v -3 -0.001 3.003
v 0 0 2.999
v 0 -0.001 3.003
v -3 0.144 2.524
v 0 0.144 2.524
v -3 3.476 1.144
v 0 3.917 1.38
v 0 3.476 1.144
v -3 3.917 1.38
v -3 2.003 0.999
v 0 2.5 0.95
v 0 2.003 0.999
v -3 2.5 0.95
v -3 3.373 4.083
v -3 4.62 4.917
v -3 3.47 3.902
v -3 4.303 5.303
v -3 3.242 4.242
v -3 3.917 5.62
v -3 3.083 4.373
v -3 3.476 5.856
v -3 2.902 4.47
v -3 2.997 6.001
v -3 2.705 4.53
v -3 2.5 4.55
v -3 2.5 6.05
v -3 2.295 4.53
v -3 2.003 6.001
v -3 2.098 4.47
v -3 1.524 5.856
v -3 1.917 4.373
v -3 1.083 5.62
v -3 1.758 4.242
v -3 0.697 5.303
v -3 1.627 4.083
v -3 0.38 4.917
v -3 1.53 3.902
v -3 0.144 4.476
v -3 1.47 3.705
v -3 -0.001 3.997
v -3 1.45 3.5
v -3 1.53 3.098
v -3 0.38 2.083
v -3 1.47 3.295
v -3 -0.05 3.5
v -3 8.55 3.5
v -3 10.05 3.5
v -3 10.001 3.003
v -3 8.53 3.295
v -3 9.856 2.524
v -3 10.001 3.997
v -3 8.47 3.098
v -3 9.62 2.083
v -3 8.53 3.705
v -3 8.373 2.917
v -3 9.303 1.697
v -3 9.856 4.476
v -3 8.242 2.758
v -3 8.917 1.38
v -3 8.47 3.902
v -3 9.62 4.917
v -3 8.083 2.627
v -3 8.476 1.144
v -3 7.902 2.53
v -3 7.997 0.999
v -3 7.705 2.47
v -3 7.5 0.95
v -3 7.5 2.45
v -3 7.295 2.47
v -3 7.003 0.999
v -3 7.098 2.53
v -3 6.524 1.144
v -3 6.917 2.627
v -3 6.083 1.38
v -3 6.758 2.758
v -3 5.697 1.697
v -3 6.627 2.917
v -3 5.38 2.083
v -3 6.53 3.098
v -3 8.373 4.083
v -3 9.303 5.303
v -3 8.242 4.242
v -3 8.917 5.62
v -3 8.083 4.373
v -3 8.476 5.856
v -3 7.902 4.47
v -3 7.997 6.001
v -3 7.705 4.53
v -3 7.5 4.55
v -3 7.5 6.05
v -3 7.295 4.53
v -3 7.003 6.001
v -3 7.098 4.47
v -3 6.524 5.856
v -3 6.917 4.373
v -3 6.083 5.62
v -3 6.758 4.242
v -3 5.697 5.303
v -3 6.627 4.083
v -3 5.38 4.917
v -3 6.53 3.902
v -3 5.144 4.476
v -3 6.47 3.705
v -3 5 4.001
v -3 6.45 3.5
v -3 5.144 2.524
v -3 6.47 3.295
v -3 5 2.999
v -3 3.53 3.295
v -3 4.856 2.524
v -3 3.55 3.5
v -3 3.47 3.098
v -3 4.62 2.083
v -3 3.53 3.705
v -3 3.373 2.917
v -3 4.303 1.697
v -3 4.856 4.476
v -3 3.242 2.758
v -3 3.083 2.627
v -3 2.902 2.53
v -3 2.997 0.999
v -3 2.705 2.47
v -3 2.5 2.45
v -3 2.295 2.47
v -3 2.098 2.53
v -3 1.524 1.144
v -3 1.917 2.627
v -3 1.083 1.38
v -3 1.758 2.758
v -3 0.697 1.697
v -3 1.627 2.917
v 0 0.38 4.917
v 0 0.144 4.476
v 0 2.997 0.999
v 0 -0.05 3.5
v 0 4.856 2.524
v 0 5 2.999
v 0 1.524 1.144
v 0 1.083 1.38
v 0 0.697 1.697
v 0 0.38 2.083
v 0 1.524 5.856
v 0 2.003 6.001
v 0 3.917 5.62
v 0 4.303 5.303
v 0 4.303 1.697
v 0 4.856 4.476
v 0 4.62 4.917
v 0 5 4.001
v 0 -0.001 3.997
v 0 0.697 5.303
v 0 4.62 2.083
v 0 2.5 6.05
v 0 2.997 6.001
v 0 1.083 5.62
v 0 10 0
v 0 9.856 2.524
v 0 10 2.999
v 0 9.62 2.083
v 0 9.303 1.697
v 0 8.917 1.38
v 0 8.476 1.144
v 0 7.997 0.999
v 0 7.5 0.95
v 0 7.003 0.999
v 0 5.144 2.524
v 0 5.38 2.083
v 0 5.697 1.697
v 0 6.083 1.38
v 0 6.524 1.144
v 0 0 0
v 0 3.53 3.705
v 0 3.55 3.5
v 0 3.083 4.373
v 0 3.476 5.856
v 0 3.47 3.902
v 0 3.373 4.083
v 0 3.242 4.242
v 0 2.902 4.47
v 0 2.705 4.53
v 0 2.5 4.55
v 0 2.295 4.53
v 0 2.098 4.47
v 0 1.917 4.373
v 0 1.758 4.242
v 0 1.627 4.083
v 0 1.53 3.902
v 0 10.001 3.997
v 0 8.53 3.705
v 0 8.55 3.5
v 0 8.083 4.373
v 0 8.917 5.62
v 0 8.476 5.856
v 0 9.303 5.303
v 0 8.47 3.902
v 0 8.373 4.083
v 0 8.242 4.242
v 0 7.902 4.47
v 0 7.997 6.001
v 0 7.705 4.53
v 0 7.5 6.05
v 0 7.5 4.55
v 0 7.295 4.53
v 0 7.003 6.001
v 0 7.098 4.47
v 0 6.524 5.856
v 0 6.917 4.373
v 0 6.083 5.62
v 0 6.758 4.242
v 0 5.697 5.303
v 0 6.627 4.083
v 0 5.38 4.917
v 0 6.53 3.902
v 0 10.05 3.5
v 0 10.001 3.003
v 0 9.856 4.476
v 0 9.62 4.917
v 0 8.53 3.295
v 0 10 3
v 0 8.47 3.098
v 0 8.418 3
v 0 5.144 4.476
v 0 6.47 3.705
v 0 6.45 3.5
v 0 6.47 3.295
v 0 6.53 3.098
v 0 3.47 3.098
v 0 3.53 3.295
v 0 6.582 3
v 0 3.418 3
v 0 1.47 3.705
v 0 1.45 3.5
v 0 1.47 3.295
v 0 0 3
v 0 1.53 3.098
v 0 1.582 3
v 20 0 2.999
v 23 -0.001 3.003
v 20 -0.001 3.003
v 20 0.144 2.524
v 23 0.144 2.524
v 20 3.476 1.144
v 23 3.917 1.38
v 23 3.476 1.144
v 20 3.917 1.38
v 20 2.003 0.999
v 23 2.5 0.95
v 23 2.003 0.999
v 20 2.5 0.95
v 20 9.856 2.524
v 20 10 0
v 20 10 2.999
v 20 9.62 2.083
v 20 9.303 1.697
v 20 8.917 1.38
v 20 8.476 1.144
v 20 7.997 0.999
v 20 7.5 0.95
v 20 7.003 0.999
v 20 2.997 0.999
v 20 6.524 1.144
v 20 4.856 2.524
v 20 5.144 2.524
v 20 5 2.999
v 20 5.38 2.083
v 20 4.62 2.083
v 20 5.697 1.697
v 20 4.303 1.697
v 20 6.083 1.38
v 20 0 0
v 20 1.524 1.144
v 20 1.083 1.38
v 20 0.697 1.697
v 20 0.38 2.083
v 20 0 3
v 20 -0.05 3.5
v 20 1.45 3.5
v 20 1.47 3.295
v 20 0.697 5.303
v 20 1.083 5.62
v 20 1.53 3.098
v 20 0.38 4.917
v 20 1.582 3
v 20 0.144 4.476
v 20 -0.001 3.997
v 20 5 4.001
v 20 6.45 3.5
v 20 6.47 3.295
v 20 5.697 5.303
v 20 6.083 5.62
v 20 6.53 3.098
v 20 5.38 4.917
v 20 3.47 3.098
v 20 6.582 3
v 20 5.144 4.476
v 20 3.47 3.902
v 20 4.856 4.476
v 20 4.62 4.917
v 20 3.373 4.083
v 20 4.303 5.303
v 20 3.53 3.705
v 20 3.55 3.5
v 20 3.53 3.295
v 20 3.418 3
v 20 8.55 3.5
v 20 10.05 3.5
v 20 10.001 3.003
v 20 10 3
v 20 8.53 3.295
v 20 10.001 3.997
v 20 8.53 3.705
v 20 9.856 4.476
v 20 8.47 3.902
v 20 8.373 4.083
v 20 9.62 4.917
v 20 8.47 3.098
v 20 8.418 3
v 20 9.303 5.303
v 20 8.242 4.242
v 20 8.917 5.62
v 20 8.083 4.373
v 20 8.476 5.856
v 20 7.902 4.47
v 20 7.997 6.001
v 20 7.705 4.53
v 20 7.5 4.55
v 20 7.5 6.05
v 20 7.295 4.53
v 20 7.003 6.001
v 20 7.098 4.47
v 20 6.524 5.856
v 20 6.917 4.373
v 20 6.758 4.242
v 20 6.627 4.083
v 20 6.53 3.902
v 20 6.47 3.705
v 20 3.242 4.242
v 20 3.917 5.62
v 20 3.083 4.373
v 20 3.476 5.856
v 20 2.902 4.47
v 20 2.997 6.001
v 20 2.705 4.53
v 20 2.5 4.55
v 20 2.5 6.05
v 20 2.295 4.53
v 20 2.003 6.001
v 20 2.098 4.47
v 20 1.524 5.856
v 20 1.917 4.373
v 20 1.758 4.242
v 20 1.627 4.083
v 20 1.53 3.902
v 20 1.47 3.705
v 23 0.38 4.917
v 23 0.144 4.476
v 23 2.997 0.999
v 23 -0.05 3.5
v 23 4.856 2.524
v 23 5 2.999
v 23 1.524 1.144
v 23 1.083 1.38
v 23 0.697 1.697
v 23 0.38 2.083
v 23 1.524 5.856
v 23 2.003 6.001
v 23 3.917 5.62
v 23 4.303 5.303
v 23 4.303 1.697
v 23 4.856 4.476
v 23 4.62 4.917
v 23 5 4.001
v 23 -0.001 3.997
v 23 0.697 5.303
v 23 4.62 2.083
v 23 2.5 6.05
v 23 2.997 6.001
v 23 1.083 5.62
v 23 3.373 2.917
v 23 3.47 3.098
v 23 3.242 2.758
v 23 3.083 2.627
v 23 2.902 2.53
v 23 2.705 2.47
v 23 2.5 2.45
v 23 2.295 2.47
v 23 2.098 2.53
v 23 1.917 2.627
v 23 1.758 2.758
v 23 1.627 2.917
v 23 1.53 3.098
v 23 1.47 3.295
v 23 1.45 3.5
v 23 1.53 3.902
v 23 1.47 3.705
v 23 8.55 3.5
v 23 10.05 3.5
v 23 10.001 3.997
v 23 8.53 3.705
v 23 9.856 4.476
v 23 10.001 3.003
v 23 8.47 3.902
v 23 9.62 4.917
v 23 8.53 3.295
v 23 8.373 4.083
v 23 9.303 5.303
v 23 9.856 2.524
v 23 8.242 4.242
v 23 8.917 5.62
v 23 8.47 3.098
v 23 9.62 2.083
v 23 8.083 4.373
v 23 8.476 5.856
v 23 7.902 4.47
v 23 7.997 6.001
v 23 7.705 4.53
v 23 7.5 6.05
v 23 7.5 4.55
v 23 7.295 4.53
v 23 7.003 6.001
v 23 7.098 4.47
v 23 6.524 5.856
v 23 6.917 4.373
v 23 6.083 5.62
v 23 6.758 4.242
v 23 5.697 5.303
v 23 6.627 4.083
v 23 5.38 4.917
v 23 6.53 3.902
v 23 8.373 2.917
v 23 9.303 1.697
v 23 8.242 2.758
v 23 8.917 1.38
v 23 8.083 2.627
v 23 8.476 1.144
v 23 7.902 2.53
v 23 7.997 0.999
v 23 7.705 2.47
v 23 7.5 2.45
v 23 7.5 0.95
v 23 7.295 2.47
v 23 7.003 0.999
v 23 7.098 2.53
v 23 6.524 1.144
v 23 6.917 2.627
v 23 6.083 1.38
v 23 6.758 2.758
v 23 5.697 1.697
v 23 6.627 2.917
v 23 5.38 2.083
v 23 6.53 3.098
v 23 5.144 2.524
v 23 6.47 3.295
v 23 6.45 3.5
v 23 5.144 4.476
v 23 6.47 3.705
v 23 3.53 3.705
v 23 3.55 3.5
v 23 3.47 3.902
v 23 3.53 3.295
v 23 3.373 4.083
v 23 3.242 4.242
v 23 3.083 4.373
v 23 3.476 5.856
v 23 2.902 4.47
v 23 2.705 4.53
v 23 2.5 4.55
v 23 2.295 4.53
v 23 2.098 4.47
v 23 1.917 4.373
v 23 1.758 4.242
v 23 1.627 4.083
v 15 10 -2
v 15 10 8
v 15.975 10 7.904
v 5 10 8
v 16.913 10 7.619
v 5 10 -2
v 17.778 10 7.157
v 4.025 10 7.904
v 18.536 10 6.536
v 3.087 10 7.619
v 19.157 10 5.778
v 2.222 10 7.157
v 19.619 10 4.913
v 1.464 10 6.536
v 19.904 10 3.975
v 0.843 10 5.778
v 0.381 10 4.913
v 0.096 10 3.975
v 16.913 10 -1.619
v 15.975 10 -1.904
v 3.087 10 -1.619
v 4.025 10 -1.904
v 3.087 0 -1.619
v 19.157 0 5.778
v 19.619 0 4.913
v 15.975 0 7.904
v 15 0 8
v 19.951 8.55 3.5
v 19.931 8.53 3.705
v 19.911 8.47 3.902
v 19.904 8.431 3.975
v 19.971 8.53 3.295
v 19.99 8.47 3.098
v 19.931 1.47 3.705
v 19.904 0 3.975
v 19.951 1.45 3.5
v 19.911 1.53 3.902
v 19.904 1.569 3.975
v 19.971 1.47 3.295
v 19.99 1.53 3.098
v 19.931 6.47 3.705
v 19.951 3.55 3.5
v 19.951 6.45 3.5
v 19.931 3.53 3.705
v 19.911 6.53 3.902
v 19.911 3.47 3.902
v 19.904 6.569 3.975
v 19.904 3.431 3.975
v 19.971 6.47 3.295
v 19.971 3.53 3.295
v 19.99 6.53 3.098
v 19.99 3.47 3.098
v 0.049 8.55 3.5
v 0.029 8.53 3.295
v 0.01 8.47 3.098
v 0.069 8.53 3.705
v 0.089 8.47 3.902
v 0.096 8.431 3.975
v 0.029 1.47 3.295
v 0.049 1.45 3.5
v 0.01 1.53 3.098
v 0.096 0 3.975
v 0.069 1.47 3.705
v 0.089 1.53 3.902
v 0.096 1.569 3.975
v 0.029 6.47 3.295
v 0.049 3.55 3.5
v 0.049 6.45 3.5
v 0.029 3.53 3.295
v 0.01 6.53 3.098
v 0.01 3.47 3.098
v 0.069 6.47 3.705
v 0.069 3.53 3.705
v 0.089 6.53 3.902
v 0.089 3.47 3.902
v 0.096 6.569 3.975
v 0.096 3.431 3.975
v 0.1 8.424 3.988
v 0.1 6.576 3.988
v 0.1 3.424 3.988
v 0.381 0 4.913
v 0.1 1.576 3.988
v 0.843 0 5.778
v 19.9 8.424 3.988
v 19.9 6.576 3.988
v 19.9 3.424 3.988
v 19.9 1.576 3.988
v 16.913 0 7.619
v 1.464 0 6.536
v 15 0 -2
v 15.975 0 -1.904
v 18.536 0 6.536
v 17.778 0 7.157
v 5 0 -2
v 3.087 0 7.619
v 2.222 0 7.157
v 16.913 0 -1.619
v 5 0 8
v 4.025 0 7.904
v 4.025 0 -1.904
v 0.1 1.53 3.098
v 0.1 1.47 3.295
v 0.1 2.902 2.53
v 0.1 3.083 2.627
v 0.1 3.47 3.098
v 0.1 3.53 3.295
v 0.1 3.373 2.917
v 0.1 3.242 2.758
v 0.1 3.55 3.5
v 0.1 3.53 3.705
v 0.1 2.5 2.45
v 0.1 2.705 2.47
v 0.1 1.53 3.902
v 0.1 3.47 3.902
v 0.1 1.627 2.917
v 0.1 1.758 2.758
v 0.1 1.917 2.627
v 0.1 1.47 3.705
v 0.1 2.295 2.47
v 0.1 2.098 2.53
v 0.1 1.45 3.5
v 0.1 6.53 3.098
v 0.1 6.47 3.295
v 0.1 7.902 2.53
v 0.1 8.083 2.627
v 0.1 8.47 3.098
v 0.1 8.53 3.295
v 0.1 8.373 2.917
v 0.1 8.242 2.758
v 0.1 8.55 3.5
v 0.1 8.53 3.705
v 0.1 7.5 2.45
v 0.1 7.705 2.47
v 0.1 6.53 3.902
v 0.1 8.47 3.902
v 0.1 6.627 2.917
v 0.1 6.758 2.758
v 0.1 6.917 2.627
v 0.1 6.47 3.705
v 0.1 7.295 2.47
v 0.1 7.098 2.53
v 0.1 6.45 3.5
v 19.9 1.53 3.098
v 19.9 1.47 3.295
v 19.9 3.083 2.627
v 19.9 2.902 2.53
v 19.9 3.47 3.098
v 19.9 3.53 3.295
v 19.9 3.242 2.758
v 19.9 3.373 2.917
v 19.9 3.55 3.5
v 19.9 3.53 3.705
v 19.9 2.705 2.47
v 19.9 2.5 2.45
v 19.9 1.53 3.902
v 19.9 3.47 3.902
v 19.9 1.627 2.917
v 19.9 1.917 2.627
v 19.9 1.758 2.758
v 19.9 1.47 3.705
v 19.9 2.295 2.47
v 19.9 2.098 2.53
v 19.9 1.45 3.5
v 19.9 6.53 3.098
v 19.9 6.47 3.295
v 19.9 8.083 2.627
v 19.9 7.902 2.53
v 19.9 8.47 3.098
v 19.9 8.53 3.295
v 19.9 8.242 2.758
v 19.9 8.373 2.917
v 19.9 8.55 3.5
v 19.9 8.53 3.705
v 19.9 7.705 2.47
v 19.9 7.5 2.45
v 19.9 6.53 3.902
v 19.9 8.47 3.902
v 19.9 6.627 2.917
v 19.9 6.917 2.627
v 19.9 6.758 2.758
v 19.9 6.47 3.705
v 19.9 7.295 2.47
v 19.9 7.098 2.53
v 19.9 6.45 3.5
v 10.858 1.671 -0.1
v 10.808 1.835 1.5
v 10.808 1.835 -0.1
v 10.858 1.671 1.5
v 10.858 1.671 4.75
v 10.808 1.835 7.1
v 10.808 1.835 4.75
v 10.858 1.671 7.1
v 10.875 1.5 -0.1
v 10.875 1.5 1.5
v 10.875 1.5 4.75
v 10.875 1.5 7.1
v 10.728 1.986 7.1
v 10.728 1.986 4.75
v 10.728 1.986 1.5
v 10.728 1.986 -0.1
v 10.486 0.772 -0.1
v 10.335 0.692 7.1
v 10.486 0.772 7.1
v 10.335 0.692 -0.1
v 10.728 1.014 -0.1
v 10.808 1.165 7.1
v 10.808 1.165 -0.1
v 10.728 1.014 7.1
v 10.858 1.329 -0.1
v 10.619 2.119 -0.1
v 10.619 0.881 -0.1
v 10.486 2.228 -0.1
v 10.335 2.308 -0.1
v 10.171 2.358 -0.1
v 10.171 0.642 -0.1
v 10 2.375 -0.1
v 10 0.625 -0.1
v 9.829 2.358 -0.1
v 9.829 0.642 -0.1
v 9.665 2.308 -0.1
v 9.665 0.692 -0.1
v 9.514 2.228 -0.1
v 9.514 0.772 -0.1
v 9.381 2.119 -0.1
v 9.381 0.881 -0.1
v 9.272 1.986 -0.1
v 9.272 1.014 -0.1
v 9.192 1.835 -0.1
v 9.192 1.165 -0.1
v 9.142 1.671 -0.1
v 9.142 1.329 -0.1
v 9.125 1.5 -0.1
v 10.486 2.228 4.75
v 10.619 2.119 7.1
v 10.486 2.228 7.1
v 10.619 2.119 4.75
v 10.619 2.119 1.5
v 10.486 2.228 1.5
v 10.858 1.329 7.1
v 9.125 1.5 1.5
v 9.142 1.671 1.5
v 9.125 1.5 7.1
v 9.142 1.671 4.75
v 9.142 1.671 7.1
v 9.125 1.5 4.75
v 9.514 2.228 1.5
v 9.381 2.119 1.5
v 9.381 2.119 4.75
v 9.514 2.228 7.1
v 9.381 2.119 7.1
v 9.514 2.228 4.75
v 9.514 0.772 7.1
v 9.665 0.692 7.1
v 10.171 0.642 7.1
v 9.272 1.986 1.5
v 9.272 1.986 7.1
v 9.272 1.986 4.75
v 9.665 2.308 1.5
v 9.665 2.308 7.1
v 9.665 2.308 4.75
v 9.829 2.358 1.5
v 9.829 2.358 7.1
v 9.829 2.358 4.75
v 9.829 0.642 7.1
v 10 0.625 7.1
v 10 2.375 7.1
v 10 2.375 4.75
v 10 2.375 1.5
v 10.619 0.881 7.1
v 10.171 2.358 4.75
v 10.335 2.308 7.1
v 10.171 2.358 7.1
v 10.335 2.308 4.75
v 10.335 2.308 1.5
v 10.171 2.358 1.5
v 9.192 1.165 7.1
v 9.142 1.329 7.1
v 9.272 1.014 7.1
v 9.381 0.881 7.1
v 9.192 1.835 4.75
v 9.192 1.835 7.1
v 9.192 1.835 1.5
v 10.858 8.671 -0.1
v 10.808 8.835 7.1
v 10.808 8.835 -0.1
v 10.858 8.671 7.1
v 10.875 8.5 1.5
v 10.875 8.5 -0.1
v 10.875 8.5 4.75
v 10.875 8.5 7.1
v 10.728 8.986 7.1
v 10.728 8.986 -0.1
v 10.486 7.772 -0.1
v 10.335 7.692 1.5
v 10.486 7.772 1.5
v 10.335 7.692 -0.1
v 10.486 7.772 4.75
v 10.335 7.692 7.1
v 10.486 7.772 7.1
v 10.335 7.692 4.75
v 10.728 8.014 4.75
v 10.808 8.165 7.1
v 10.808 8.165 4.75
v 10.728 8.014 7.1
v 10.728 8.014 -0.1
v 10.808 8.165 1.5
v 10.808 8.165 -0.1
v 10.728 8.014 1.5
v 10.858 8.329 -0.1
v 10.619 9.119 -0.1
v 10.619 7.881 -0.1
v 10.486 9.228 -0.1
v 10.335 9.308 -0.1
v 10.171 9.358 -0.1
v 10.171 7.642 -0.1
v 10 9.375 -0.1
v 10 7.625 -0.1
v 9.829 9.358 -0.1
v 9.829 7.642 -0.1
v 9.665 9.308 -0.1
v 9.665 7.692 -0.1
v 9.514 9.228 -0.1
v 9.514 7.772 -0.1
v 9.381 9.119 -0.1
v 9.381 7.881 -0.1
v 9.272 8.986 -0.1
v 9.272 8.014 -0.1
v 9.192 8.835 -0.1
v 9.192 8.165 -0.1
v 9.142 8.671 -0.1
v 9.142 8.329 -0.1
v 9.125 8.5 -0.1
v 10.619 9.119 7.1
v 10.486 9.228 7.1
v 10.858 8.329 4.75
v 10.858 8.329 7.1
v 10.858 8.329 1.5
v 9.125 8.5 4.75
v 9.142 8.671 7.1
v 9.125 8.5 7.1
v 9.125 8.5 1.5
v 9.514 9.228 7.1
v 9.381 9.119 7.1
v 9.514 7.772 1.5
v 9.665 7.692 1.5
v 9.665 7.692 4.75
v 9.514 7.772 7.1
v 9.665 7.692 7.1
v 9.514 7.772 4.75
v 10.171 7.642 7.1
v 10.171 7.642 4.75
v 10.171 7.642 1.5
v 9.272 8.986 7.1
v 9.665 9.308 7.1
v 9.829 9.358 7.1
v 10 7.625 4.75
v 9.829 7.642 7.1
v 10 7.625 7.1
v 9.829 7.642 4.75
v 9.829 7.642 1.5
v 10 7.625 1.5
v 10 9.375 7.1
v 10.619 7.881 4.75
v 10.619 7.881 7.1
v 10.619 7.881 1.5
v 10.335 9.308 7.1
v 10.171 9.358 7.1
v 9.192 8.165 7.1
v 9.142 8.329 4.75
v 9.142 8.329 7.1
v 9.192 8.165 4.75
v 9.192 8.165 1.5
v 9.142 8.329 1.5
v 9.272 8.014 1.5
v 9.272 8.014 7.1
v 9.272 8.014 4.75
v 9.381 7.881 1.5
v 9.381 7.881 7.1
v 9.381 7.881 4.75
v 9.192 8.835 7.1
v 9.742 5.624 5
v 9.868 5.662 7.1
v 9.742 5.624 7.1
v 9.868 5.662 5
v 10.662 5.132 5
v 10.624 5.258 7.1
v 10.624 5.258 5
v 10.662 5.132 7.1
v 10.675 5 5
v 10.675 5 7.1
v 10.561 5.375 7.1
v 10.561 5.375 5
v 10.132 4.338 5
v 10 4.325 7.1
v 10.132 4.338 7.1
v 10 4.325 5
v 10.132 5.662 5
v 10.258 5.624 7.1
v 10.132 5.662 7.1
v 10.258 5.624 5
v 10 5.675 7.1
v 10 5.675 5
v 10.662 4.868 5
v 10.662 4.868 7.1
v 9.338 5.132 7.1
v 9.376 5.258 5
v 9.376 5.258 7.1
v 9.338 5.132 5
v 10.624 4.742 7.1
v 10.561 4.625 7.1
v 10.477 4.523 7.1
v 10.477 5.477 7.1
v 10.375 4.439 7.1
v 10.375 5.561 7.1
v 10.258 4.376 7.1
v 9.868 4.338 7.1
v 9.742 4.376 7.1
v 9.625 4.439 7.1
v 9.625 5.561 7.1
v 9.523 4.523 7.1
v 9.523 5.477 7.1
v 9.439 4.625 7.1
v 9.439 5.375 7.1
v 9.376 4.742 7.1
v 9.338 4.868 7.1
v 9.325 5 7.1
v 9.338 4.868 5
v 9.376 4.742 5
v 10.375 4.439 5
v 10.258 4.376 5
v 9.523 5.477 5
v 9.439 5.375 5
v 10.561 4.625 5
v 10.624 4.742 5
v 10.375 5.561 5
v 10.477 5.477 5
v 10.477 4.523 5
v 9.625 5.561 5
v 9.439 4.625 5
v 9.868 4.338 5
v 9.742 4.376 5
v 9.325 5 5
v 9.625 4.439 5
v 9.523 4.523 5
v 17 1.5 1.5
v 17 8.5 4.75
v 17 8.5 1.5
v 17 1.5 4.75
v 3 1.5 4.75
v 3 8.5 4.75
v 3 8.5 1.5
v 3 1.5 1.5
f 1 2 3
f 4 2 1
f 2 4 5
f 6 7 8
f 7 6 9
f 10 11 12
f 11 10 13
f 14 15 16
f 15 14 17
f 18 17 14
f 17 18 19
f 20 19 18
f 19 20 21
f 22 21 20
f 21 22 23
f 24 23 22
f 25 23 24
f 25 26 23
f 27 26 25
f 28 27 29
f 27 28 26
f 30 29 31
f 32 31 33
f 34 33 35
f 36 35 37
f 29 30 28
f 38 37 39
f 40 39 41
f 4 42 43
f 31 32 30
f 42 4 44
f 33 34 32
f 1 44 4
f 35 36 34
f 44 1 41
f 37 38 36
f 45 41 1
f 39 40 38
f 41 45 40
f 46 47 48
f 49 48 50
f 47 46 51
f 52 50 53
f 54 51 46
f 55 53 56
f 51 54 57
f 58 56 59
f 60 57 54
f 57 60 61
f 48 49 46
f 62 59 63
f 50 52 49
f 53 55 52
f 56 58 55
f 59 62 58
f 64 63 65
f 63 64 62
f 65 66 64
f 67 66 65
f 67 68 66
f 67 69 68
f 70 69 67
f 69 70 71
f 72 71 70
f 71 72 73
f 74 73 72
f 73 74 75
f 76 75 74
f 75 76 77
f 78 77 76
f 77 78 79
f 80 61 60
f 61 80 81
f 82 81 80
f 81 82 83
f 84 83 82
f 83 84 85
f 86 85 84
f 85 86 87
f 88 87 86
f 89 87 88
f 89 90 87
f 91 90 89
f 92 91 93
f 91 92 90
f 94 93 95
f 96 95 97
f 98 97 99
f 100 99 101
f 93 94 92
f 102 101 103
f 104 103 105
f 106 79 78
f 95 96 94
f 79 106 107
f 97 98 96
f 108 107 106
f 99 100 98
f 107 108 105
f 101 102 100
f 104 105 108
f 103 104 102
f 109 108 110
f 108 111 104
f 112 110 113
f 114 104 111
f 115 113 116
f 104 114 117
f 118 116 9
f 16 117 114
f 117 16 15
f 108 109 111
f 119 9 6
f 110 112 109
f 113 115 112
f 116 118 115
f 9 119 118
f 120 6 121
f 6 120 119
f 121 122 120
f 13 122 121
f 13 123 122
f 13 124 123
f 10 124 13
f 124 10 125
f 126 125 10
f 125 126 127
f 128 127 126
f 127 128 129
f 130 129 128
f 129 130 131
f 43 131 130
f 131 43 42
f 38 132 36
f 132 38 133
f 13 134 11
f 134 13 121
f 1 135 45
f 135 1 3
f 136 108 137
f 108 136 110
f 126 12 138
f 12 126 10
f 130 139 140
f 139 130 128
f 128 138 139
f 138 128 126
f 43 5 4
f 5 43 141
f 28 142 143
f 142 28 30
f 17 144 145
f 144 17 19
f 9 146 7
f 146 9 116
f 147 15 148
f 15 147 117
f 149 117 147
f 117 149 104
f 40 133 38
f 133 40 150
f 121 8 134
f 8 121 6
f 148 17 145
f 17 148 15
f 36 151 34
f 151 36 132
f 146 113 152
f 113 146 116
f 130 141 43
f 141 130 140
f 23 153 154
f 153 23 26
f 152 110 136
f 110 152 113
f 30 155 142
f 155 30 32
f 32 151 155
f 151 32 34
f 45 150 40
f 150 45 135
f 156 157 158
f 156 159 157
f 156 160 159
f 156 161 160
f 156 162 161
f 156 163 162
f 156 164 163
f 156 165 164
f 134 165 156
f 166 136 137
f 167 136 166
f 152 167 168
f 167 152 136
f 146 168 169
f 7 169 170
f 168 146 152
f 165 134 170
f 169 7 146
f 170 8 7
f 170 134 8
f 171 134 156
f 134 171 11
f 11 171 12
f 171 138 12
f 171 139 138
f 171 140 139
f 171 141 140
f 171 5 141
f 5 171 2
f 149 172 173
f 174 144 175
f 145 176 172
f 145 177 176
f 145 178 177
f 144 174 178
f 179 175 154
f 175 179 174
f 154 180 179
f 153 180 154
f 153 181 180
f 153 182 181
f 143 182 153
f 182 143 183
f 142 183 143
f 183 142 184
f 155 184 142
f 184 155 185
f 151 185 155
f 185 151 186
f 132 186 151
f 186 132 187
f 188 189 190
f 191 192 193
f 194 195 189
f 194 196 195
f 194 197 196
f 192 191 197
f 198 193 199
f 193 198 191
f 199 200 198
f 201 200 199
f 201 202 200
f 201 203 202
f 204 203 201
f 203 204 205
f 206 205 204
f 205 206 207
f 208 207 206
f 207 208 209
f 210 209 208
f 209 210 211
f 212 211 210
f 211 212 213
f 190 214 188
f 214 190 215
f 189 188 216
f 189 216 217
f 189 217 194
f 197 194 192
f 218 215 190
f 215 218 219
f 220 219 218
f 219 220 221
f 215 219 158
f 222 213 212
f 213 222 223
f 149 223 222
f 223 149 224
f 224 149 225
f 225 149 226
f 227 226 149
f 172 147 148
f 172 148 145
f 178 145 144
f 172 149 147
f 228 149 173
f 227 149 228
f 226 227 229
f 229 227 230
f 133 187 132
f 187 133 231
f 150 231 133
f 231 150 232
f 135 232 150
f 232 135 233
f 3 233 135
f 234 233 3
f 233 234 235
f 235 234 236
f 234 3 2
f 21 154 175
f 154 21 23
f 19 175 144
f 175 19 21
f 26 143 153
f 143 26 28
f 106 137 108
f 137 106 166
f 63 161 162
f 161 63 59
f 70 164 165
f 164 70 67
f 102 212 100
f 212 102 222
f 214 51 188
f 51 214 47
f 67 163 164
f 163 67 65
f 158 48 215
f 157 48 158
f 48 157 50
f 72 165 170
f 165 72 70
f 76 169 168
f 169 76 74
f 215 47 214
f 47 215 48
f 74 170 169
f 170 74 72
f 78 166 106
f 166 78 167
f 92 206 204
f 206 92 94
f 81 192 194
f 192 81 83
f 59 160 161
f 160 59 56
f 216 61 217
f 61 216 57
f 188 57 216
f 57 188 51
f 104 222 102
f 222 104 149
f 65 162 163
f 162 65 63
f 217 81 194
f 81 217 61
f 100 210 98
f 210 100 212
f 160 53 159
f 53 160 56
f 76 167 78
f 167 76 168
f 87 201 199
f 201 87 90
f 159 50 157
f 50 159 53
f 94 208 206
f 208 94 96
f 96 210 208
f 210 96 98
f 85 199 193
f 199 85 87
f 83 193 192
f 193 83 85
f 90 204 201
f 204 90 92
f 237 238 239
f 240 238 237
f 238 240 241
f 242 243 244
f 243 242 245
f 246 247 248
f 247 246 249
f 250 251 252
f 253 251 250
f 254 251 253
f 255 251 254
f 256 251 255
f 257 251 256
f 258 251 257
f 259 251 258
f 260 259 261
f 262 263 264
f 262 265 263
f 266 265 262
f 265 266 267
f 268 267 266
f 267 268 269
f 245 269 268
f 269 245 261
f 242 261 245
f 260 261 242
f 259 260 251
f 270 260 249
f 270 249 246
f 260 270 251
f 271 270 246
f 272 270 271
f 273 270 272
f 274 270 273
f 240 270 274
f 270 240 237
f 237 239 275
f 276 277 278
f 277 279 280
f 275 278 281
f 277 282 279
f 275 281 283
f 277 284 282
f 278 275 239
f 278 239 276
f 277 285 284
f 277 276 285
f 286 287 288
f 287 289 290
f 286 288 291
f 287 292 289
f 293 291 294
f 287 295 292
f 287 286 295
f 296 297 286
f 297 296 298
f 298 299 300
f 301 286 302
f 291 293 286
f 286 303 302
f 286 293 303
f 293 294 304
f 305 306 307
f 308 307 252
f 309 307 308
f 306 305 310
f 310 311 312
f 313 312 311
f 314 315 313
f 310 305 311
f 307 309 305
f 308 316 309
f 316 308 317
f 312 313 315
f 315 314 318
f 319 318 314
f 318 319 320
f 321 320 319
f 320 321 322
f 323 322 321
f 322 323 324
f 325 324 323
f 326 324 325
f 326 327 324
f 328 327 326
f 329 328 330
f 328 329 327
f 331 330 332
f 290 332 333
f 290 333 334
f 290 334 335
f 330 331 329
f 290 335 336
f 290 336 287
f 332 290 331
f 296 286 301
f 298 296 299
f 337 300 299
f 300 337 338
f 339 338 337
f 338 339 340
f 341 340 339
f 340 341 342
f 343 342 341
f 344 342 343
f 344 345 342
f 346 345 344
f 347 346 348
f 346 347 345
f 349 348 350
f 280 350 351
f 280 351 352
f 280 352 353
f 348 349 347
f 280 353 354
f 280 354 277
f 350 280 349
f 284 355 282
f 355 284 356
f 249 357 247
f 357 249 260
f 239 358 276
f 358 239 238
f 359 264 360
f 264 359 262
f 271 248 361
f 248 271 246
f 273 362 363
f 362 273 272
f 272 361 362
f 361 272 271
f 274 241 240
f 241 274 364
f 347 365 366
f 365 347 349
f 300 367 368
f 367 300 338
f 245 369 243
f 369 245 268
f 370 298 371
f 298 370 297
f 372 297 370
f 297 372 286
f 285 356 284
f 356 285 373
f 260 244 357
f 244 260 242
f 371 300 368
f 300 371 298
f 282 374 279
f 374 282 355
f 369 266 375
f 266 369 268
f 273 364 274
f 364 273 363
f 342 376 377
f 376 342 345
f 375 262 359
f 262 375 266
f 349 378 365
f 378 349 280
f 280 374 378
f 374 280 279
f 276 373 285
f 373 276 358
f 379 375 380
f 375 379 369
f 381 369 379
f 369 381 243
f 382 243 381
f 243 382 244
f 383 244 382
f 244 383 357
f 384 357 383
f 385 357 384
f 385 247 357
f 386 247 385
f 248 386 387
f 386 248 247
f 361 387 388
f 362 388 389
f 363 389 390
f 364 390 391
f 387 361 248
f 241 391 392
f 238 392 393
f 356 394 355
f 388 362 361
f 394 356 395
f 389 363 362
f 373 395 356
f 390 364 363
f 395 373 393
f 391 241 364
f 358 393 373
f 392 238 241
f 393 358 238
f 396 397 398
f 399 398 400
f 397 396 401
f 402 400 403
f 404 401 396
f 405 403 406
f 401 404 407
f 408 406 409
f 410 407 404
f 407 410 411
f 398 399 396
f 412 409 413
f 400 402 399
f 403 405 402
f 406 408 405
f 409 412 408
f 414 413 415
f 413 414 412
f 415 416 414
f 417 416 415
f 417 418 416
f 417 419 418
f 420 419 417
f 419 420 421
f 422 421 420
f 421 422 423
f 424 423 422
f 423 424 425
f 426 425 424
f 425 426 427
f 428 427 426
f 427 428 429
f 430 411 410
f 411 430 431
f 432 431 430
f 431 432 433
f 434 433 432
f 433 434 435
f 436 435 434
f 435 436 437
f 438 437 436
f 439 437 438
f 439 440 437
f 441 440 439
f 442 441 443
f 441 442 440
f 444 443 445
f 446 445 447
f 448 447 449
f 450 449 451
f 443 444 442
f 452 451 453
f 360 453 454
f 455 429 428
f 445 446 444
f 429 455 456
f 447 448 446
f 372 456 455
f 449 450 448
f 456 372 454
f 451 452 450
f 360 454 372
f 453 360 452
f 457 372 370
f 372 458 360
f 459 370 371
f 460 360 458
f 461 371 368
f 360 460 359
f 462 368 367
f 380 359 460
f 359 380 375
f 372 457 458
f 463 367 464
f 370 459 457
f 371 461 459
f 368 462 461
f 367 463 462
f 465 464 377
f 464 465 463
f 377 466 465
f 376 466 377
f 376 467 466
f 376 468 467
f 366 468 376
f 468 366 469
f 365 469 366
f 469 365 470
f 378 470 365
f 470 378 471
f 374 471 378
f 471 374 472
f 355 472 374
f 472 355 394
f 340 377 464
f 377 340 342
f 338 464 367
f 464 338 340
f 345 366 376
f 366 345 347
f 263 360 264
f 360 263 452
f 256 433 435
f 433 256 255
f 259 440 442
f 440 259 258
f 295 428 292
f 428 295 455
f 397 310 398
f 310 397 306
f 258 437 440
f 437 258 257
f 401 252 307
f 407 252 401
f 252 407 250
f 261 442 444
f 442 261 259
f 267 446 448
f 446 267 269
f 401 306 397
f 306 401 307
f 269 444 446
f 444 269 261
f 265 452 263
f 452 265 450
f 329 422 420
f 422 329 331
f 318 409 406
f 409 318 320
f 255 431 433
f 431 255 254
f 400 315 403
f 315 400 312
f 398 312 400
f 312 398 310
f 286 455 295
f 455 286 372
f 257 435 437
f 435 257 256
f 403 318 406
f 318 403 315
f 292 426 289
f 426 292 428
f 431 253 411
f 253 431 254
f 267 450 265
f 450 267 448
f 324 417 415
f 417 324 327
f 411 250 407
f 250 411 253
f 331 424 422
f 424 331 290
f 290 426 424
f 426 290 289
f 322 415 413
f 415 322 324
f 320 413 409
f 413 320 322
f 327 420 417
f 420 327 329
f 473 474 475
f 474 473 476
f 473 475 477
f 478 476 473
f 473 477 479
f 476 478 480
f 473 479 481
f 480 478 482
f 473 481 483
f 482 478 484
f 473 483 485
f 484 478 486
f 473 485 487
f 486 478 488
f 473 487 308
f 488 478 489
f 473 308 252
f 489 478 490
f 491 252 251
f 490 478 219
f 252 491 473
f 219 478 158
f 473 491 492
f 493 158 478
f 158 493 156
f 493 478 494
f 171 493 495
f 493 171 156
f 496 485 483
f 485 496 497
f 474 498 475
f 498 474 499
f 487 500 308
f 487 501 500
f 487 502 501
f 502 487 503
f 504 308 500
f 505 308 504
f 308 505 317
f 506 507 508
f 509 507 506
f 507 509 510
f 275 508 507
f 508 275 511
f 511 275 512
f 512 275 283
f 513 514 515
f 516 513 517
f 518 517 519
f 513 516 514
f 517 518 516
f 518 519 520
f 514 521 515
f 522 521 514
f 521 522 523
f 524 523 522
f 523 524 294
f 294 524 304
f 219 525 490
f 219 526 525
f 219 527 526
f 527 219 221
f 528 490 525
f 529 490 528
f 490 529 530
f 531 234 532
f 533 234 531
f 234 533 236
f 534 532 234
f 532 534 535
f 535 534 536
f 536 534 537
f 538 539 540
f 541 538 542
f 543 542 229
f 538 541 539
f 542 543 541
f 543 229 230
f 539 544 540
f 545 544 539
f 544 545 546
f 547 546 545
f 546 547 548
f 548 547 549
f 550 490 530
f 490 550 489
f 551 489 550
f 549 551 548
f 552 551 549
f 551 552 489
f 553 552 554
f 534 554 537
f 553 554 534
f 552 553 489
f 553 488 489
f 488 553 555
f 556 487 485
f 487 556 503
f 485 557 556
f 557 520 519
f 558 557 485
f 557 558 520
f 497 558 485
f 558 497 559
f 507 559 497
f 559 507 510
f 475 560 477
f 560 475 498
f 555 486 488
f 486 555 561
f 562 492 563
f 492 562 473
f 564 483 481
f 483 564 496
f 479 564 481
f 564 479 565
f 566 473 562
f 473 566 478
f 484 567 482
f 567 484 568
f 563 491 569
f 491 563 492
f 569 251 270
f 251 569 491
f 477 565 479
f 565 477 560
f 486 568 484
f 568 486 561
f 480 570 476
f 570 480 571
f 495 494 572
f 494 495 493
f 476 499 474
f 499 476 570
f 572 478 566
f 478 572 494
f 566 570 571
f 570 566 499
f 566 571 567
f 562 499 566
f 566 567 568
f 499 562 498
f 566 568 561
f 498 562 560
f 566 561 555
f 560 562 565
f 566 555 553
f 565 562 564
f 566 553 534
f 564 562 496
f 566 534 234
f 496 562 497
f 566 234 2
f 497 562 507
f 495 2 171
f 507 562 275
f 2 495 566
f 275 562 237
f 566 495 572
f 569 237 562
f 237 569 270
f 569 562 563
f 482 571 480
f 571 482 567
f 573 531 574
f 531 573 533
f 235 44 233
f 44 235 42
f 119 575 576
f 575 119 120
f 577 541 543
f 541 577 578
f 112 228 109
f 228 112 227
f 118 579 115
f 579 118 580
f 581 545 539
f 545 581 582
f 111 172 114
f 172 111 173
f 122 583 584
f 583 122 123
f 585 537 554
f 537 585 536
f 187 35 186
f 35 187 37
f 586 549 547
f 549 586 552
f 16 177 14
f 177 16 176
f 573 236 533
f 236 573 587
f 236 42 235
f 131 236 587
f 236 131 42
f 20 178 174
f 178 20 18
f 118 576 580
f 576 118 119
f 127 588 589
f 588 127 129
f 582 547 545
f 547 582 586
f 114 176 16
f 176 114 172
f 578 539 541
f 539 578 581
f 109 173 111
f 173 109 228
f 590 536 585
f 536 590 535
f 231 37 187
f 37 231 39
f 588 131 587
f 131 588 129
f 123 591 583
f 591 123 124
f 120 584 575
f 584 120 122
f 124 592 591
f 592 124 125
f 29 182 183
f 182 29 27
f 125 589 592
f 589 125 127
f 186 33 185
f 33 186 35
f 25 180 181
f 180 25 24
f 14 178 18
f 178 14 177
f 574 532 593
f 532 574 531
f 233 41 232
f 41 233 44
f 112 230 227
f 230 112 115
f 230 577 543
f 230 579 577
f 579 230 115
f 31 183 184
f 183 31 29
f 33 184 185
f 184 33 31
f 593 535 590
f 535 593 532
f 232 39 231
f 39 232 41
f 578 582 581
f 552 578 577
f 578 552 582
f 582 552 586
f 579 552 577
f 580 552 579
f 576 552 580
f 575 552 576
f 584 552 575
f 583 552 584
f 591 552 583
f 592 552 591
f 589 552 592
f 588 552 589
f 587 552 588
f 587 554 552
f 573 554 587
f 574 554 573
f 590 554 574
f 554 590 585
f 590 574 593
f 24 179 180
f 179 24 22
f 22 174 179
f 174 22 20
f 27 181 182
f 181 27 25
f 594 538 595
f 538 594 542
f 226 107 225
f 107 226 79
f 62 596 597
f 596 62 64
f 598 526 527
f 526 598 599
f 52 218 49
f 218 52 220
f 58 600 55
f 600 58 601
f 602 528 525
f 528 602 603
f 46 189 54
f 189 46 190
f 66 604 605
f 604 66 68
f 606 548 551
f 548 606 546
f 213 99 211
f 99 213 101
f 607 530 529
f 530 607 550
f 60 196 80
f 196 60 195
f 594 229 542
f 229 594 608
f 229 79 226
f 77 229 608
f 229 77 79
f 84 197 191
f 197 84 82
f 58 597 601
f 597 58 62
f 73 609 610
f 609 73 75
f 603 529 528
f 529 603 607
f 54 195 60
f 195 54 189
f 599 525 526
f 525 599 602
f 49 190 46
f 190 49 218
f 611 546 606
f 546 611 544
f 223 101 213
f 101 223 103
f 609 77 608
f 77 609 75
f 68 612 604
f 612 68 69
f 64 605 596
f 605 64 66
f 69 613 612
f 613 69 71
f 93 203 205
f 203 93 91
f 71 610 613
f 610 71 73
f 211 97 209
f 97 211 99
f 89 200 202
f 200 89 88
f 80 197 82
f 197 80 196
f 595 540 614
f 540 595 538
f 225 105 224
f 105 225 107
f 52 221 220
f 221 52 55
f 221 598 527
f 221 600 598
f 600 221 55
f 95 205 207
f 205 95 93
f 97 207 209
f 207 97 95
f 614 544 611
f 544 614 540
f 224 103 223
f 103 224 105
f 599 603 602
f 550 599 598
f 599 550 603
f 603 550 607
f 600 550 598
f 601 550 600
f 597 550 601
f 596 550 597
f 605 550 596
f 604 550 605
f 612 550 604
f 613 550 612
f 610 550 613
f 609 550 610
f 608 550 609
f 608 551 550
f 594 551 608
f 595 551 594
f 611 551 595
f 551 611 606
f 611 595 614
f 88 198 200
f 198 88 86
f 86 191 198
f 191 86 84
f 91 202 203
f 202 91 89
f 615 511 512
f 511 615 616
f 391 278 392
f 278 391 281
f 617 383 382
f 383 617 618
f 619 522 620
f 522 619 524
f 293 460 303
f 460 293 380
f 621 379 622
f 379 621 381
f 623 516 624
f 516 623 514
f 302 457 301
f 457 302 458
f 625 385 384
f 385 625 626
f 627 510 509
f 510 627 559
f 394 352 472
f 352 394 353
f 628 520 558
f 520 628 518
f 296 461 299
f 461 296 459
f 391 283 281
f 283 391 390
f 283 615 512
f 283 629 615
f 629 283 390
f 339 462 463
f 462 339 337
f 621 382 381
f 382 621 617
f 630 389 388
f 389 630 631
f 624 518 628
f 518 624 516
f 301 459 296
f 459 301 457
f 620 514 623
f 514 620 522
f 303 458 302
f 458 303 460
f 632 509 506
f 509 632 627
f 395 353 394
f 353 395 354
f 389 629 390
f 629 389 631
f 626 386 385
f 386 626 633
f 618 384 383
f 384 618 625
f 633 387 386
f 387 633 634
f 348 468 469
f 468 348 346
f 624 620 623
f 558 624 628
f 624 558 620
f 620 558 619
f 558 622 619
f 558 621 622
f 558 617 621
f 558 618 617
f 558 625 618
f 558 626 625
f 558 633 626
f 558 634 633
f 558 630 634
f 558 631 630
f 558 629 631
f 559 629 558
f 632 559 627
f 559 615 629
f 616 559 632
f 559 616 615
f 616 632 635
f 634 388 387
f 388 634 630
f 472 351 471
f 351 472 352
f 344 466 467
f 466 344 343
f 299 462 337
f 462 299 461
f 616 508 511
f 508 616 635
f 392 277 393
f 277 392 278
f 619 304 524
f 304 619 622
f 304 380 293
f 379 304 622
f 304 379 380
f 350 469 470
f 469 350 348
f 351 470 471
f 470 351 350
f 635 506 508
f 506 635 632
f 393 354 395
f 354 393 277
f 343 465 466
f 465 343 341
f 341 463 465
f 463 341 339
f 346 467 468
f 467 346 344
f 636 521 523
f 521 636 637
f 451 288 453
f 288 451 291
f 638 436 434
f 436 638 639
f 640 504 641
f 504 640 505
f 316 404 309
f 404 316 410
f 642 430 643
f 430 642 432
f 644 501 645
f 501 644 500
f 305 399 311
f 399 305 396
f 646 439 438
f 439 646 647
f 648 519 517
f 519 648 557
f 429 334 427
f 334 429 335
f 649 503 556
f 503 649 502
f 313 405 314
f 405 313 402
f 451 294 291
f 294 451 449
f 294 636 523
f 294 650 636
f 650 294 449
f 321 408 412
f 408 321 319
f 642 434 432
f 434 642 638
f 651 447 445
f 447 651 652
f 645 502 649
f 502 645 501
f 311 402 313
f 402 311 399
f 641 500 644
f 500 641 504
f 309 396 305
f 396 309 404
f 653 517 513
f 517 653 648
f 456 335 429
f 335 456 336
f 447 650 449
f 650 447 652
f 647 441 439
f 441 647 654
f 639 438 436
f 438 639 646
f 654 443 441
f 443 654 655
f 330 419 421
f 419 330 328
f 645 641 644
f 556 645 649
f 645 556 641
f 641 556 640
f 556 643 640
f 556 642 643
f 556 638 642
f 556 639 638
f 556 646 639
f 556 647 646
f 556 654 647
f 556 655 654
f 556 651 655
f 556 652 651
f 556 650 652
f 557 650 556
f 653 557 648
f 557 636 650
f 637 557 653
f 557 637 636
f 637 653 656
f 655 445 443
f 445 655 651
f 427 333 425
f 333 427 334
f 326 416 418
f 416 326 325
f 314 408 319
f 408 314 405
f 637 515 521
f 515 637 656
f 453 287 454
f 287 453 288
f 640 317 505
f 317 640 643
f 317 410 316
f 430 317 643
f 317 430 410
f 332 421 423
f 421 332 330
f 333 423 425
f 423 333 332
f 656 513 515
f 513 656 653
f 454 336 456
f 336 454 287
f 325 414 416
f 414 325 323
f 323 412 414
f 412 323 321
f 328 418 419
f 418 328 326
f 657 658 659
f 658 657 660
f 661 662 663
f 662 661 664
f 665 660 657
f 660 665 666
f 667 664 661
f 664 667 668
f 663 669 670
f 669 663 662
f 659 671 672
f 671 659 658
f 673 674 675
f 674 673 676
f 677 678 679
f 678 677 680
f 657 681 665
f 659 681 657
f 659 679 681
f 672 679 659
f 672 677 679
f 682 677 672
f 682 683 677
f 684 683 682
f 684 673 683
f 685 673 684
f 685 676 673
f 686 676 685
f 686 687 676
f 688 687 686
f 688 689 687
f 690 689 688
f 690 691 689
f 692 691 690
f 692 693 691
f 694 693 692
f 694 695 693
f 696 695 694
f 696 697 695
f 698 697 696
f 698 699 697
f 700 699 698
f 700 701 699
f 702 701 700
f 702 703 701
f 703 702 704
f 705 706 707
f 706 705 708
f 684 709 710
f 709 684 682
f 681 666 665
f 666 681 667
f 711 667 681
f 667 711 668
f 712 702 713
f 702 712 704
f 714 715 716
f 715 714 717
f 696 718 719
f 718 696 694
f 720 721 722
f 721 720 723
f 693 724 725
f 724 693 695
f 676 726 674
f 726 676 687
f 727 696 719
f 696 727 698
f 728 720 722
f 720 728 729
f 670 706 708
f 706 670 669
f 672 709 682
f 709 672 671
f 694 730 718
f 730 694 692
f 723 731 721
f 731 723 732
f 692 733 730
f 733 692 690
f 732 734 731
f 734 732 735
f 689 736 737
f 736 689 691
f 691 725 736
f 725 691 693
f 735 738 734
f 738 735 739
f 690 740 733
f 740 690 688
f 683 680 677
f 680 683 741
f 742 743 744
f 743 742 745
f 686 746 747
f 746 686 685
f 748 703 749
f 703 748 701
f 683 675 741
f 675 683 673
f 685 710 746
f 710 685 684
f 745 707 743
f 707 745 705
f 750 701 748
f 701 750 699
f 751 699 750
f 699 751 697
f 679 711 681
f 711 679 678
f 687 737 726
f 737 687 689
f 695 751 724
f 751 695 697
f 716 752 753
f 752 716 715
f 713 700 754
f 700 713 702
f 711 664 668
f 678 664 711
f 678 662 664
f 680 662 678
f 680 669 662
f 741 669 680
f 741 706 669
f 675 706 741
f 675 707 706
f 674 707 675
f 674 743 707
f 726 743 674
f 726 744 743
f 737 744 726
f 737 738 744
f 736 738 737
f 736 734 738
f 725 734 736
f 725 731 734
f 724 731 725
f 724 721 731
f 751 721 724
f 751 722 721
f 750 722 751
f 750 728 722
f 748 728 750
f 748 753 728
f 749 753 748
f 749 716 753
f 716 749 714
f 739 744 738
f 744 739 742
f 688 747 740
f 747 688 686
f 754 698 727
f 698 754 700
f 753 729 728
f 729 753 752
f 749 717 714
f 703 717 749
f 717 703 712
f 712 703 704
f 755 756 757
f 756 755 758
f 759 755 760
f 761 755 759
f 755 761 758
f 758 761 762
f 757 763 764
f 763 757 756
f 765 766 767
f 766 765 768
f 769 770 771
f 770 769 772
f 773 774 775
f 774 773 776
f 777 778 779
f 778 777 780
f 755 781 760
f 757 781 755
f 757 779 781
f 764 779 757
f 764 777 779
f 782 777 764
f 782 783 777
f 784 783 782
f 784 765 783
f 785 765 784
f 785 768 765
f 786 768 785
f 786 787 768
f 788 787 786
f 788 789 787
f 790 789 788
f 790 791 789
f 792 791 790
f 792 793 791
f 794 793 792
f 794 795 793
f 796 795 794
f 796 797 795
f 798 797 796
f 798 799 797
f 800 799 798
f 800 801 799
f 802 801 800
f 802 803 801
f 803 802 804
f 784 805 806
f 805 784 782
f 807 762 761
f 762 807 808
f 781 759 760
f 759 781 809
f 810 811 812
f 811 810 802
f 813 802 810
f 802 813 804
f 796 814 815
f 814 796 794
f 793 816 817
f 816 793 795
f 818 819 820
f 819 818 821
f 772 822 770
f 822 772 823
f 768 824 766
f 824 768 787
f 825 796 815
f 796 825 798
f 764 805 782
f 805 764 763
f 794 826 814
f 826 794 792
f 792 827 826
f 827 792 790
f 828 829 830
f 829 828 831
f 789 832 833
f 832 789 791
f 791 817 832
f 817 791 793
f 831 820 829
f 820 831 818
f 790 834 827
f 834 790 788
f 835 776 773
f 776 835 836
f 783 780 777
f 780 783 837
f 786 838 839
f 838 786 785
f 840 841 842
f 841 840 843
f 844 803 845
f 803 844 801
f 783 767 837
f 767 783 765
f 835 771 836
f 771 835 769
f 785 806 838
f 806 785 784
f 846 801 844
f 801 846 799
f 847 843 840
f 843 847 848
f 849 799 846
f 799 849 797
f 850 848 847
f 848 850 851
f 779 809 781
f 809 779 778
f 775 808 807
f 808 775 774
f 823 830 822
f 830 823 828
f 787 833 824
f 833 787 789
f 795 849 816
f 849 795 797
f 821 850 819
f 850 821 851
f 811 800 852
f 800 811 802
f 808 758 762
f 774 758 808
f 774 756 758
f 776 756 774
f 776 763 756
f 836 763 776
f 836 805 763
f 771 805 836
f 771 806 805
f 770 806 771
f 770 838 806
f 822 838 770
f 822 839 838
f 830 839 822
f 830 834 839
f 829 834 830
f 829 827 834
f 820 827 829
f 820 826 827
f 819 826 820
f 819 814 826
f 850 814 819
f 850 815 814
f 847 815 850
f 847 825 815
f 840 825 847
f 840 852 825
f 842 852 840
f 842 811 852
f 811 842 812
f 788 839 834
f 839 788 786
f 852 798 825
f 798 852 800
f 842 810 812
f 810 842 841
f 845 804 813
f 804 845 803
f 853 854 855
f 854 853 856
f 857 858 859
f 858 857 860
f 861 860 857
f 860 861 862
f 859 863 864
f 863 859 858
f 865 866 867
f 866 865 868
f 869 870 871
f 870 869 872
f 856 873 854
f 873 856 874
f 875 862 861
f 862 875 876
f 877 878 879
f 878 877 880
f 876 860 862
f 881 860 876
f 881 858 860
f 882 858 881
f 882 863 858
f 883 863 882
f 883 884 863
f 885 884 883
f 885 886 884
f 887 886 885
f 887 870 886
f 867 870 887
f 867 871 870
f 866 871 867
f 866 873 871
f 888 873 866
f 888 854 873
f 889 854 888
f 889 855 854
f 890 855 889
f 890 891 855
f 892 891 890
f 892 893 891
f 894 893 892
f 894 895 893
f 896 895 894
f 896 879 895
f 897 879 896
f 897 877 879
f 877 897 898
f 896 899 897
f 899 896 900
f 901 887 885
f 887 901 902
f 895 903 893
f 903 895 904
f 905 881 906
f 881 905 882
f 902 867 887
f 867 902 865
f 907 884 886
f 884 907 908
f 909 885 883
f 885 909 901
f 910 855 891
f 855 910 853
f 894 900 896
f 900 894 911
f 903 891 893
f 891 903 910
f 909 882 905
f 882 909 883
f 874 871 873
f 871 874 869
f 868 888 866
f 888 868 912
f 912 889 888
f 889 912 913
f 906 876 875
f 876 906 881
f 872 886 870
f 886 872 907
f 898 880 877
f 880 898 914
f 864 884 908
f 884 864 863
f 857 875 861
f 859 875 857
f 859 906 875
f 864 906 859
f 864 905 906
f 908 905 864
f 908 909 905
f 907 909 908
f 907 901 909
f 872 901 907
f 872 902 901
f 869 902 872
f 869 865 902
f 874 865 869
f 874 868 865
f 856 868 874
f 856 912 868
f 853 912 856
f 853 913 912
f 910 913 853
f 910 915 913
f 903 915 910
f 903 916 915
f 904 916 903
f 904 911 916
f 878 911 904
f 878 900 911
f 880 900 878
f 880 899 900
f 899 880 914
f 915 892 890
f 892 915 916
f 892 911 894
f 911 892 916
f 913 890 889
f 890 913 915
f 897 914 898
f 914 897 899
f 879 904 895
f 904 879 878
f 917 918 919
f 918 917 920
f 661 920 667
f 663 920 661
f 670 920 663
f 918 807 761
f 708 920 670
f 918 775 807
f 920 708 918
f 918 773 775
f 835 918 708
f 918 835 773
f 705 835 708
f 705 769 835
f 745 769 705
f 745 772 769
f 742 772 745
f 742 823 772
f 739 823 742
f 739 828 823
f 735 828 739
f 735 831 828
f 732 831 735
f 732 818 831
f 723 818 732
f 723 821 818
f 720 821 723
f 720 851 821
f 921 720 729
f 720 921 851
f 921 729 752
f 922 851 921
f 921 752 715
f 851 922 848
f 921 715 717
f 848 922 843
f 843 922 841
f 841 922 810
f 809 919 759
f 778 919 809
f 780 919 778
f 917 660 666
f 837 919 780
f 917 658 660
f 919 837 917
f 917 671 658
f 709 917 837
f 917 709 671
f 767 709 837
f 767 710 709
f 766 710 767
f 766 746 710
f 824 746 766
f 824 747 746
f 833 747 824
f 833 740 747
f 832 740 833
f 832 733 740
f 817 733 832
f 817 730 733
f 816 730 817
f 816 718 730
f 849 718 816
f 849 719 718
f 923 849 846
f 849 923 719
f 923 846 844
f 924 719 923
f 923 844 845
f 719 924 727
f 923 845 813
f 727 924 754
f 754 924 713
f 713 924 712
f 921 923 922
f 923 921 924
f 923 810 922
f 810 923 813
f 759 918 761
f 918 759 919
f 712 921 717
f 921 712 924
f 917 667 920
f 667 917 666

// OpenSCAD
// ============================================================
// finger_segment_proximal.scad
// Proximal (first) Finger Segment – closest to palm
// Humanoid Welcoming Robot – tendon-driven hand
//
// Print Settings:
//   Material:    PLA
//   Infill:      15%
//   Layer height: 0.2 mm
//   Supports:    None required
//   Weight:      ~4 g
//   Print time:  ~3 minutes
// ============================================================

$fn = 32;
$fa = 6;
$fs = 1;

// --- Parametric Variables ---
length                = 20;   // mm  segment length (tip-to-tip)
width                 = 10;   // mm  segment width
thickness             = 7;    // mm  segment height/thickness
hinge_pin_diameter    = 2;    // mm  hinge pin outer diameter
hinge_pin_bore        = 2.1;  // mm  hinge hole diameter (0.1 mm tolerance)
tendon_hole_diameter  = 1.35; // mm  fishing-line tendon hole (top face)
elastic_hole_diameter = 1.75; // mm  elastic band return holes (bottom face)
elastic_hole_spacing  = 7;    // mm  distance between two bottom holes
outer_radius          = 5;    // mm  dorsal (top) curvature radius
wall_min              = 1.5;  // mm  minimum wall thickness
channel_radius        = 0.5;  // mm  internal channel fillet for low friction

// Derived
hinge_boss_od    = hinge_pin_bore + wall_min * 2;  // boss outer diameter
hinge_boss_depth = 3.0;                            // boss protrusion from end

// ============================================================
// Module: segment_body
// Main finger link with rounded dorsal surface
// ============================================================
module segment_body() {
    hull() {
        // Flat bottom rail
        translate([0, 0, 0])
            cube([length, width, thickness / 4]);
        // Rounded dorsal top
        translate([outer_radius, width / 2, thickness - outer_radius + 1])
            rotate([90, 0, 0])
                cylinder(r = outer_radius, h = width, center = true);
        translate([length - outer_radius, width / 2, thickness - outer_radius + 1])
            rotate([90, 0, 0])
                cylinder(r = outer_radius, h = width, center = true);
    }
}

// ============================================================
// Module: hinge_bosses
// Cylindrical boss on each end for hinge pin
// ============================================================
module hinge_bosses() {
    // Proximal (palm) end – solid boss (male pin goes through palm socket)
    for (y_pos = [width * 0.25, width * 0.75])
        translate([-hinge_boss_depth, y_pos, thickness / 2])
            rotate([0, 90, 0])
                cylinder(d = hinge_boss_od, h = hinge_boss_depth);
    // Distal end – boss with through-hole (female, receives pin from middle seg)
    for (y_pos = [width * 0.25, width * 0.75])
        translate([length, y_pos, thickness / 2])
            rotate([0, 90, 0])
                cylinder(d = hinge_boss_od, h = hinge_boss_depth);
}

// ============================================================
// Module: hinge_bore
// Drills hinge pin holes through bosses
// ============================================================
module hinge_bore_cuts() {
    // Both ends
    for (x_pos = [-hinge_boss_depth - 0.1, length - 0.1])
        for (y_pos = [width * 0.25, width * 0.75])
            translate([x_pos, y_pos, thickness / 2])
                rotate([0, 90, 0])
                    cylinder(d = hinge_pin_bore, h = hinge_boss_depth + 0.2);
}

// ============================================================
// Module: tendon_channel
// Single tendon hole on top face with smooth inner channel
// ============================================================
module tendon_channel() {
    // Vertical bore from top face, exits bottom
    translate([length / 2, width / 2, -0.1])
        cylinder(d = tendon_hole_diameter, h = thickness + 0.2);
}

// ============================================================
// Module: elastic_channels
// Two symmetric elastic band holes on bottom face
// ============================================================
module elastic_channels() {
    for (dy = [-elastic_hole_spacing / 2, elastic_hole_spacing / 2])
        translate([length / 2, width / 2 + dy, -0.1])
            cylinder(d = elastic_hole_diameter, h = thickness + 0.2);
}

// ============================================================
// Module: finger_segment_proximal
// Full proximal segment
// ============================================================
module finger_segment_proximal() {
    difference() {
        union() {
            segment_body();
            hinge_bosses();
        }
        // Hinge pin bores
        hinge_bore_cuts();
        // Tendon hole (top/dorsal face, 2 mm from outer surface)
        translate([length / 2, width / 2, thickness - 2])
            cylinder(d = tendon_hole_diameter, h = 2.1);
        // Elastic holes (bottom face)
        elastic_channels();
        // Internal lightening (keeps 1.5 mm walls)
        translate([wall_min * 2, wall_min, wall_min])
            cube([length - wall_min * 4,
                  width  - wall_min * 2,
                  thickness - wall_min * 2.5]);
    }
}

// ============================================================
// Render
// ============================================================
color("CornflowerBlue")
    finger_segment_proximal();
